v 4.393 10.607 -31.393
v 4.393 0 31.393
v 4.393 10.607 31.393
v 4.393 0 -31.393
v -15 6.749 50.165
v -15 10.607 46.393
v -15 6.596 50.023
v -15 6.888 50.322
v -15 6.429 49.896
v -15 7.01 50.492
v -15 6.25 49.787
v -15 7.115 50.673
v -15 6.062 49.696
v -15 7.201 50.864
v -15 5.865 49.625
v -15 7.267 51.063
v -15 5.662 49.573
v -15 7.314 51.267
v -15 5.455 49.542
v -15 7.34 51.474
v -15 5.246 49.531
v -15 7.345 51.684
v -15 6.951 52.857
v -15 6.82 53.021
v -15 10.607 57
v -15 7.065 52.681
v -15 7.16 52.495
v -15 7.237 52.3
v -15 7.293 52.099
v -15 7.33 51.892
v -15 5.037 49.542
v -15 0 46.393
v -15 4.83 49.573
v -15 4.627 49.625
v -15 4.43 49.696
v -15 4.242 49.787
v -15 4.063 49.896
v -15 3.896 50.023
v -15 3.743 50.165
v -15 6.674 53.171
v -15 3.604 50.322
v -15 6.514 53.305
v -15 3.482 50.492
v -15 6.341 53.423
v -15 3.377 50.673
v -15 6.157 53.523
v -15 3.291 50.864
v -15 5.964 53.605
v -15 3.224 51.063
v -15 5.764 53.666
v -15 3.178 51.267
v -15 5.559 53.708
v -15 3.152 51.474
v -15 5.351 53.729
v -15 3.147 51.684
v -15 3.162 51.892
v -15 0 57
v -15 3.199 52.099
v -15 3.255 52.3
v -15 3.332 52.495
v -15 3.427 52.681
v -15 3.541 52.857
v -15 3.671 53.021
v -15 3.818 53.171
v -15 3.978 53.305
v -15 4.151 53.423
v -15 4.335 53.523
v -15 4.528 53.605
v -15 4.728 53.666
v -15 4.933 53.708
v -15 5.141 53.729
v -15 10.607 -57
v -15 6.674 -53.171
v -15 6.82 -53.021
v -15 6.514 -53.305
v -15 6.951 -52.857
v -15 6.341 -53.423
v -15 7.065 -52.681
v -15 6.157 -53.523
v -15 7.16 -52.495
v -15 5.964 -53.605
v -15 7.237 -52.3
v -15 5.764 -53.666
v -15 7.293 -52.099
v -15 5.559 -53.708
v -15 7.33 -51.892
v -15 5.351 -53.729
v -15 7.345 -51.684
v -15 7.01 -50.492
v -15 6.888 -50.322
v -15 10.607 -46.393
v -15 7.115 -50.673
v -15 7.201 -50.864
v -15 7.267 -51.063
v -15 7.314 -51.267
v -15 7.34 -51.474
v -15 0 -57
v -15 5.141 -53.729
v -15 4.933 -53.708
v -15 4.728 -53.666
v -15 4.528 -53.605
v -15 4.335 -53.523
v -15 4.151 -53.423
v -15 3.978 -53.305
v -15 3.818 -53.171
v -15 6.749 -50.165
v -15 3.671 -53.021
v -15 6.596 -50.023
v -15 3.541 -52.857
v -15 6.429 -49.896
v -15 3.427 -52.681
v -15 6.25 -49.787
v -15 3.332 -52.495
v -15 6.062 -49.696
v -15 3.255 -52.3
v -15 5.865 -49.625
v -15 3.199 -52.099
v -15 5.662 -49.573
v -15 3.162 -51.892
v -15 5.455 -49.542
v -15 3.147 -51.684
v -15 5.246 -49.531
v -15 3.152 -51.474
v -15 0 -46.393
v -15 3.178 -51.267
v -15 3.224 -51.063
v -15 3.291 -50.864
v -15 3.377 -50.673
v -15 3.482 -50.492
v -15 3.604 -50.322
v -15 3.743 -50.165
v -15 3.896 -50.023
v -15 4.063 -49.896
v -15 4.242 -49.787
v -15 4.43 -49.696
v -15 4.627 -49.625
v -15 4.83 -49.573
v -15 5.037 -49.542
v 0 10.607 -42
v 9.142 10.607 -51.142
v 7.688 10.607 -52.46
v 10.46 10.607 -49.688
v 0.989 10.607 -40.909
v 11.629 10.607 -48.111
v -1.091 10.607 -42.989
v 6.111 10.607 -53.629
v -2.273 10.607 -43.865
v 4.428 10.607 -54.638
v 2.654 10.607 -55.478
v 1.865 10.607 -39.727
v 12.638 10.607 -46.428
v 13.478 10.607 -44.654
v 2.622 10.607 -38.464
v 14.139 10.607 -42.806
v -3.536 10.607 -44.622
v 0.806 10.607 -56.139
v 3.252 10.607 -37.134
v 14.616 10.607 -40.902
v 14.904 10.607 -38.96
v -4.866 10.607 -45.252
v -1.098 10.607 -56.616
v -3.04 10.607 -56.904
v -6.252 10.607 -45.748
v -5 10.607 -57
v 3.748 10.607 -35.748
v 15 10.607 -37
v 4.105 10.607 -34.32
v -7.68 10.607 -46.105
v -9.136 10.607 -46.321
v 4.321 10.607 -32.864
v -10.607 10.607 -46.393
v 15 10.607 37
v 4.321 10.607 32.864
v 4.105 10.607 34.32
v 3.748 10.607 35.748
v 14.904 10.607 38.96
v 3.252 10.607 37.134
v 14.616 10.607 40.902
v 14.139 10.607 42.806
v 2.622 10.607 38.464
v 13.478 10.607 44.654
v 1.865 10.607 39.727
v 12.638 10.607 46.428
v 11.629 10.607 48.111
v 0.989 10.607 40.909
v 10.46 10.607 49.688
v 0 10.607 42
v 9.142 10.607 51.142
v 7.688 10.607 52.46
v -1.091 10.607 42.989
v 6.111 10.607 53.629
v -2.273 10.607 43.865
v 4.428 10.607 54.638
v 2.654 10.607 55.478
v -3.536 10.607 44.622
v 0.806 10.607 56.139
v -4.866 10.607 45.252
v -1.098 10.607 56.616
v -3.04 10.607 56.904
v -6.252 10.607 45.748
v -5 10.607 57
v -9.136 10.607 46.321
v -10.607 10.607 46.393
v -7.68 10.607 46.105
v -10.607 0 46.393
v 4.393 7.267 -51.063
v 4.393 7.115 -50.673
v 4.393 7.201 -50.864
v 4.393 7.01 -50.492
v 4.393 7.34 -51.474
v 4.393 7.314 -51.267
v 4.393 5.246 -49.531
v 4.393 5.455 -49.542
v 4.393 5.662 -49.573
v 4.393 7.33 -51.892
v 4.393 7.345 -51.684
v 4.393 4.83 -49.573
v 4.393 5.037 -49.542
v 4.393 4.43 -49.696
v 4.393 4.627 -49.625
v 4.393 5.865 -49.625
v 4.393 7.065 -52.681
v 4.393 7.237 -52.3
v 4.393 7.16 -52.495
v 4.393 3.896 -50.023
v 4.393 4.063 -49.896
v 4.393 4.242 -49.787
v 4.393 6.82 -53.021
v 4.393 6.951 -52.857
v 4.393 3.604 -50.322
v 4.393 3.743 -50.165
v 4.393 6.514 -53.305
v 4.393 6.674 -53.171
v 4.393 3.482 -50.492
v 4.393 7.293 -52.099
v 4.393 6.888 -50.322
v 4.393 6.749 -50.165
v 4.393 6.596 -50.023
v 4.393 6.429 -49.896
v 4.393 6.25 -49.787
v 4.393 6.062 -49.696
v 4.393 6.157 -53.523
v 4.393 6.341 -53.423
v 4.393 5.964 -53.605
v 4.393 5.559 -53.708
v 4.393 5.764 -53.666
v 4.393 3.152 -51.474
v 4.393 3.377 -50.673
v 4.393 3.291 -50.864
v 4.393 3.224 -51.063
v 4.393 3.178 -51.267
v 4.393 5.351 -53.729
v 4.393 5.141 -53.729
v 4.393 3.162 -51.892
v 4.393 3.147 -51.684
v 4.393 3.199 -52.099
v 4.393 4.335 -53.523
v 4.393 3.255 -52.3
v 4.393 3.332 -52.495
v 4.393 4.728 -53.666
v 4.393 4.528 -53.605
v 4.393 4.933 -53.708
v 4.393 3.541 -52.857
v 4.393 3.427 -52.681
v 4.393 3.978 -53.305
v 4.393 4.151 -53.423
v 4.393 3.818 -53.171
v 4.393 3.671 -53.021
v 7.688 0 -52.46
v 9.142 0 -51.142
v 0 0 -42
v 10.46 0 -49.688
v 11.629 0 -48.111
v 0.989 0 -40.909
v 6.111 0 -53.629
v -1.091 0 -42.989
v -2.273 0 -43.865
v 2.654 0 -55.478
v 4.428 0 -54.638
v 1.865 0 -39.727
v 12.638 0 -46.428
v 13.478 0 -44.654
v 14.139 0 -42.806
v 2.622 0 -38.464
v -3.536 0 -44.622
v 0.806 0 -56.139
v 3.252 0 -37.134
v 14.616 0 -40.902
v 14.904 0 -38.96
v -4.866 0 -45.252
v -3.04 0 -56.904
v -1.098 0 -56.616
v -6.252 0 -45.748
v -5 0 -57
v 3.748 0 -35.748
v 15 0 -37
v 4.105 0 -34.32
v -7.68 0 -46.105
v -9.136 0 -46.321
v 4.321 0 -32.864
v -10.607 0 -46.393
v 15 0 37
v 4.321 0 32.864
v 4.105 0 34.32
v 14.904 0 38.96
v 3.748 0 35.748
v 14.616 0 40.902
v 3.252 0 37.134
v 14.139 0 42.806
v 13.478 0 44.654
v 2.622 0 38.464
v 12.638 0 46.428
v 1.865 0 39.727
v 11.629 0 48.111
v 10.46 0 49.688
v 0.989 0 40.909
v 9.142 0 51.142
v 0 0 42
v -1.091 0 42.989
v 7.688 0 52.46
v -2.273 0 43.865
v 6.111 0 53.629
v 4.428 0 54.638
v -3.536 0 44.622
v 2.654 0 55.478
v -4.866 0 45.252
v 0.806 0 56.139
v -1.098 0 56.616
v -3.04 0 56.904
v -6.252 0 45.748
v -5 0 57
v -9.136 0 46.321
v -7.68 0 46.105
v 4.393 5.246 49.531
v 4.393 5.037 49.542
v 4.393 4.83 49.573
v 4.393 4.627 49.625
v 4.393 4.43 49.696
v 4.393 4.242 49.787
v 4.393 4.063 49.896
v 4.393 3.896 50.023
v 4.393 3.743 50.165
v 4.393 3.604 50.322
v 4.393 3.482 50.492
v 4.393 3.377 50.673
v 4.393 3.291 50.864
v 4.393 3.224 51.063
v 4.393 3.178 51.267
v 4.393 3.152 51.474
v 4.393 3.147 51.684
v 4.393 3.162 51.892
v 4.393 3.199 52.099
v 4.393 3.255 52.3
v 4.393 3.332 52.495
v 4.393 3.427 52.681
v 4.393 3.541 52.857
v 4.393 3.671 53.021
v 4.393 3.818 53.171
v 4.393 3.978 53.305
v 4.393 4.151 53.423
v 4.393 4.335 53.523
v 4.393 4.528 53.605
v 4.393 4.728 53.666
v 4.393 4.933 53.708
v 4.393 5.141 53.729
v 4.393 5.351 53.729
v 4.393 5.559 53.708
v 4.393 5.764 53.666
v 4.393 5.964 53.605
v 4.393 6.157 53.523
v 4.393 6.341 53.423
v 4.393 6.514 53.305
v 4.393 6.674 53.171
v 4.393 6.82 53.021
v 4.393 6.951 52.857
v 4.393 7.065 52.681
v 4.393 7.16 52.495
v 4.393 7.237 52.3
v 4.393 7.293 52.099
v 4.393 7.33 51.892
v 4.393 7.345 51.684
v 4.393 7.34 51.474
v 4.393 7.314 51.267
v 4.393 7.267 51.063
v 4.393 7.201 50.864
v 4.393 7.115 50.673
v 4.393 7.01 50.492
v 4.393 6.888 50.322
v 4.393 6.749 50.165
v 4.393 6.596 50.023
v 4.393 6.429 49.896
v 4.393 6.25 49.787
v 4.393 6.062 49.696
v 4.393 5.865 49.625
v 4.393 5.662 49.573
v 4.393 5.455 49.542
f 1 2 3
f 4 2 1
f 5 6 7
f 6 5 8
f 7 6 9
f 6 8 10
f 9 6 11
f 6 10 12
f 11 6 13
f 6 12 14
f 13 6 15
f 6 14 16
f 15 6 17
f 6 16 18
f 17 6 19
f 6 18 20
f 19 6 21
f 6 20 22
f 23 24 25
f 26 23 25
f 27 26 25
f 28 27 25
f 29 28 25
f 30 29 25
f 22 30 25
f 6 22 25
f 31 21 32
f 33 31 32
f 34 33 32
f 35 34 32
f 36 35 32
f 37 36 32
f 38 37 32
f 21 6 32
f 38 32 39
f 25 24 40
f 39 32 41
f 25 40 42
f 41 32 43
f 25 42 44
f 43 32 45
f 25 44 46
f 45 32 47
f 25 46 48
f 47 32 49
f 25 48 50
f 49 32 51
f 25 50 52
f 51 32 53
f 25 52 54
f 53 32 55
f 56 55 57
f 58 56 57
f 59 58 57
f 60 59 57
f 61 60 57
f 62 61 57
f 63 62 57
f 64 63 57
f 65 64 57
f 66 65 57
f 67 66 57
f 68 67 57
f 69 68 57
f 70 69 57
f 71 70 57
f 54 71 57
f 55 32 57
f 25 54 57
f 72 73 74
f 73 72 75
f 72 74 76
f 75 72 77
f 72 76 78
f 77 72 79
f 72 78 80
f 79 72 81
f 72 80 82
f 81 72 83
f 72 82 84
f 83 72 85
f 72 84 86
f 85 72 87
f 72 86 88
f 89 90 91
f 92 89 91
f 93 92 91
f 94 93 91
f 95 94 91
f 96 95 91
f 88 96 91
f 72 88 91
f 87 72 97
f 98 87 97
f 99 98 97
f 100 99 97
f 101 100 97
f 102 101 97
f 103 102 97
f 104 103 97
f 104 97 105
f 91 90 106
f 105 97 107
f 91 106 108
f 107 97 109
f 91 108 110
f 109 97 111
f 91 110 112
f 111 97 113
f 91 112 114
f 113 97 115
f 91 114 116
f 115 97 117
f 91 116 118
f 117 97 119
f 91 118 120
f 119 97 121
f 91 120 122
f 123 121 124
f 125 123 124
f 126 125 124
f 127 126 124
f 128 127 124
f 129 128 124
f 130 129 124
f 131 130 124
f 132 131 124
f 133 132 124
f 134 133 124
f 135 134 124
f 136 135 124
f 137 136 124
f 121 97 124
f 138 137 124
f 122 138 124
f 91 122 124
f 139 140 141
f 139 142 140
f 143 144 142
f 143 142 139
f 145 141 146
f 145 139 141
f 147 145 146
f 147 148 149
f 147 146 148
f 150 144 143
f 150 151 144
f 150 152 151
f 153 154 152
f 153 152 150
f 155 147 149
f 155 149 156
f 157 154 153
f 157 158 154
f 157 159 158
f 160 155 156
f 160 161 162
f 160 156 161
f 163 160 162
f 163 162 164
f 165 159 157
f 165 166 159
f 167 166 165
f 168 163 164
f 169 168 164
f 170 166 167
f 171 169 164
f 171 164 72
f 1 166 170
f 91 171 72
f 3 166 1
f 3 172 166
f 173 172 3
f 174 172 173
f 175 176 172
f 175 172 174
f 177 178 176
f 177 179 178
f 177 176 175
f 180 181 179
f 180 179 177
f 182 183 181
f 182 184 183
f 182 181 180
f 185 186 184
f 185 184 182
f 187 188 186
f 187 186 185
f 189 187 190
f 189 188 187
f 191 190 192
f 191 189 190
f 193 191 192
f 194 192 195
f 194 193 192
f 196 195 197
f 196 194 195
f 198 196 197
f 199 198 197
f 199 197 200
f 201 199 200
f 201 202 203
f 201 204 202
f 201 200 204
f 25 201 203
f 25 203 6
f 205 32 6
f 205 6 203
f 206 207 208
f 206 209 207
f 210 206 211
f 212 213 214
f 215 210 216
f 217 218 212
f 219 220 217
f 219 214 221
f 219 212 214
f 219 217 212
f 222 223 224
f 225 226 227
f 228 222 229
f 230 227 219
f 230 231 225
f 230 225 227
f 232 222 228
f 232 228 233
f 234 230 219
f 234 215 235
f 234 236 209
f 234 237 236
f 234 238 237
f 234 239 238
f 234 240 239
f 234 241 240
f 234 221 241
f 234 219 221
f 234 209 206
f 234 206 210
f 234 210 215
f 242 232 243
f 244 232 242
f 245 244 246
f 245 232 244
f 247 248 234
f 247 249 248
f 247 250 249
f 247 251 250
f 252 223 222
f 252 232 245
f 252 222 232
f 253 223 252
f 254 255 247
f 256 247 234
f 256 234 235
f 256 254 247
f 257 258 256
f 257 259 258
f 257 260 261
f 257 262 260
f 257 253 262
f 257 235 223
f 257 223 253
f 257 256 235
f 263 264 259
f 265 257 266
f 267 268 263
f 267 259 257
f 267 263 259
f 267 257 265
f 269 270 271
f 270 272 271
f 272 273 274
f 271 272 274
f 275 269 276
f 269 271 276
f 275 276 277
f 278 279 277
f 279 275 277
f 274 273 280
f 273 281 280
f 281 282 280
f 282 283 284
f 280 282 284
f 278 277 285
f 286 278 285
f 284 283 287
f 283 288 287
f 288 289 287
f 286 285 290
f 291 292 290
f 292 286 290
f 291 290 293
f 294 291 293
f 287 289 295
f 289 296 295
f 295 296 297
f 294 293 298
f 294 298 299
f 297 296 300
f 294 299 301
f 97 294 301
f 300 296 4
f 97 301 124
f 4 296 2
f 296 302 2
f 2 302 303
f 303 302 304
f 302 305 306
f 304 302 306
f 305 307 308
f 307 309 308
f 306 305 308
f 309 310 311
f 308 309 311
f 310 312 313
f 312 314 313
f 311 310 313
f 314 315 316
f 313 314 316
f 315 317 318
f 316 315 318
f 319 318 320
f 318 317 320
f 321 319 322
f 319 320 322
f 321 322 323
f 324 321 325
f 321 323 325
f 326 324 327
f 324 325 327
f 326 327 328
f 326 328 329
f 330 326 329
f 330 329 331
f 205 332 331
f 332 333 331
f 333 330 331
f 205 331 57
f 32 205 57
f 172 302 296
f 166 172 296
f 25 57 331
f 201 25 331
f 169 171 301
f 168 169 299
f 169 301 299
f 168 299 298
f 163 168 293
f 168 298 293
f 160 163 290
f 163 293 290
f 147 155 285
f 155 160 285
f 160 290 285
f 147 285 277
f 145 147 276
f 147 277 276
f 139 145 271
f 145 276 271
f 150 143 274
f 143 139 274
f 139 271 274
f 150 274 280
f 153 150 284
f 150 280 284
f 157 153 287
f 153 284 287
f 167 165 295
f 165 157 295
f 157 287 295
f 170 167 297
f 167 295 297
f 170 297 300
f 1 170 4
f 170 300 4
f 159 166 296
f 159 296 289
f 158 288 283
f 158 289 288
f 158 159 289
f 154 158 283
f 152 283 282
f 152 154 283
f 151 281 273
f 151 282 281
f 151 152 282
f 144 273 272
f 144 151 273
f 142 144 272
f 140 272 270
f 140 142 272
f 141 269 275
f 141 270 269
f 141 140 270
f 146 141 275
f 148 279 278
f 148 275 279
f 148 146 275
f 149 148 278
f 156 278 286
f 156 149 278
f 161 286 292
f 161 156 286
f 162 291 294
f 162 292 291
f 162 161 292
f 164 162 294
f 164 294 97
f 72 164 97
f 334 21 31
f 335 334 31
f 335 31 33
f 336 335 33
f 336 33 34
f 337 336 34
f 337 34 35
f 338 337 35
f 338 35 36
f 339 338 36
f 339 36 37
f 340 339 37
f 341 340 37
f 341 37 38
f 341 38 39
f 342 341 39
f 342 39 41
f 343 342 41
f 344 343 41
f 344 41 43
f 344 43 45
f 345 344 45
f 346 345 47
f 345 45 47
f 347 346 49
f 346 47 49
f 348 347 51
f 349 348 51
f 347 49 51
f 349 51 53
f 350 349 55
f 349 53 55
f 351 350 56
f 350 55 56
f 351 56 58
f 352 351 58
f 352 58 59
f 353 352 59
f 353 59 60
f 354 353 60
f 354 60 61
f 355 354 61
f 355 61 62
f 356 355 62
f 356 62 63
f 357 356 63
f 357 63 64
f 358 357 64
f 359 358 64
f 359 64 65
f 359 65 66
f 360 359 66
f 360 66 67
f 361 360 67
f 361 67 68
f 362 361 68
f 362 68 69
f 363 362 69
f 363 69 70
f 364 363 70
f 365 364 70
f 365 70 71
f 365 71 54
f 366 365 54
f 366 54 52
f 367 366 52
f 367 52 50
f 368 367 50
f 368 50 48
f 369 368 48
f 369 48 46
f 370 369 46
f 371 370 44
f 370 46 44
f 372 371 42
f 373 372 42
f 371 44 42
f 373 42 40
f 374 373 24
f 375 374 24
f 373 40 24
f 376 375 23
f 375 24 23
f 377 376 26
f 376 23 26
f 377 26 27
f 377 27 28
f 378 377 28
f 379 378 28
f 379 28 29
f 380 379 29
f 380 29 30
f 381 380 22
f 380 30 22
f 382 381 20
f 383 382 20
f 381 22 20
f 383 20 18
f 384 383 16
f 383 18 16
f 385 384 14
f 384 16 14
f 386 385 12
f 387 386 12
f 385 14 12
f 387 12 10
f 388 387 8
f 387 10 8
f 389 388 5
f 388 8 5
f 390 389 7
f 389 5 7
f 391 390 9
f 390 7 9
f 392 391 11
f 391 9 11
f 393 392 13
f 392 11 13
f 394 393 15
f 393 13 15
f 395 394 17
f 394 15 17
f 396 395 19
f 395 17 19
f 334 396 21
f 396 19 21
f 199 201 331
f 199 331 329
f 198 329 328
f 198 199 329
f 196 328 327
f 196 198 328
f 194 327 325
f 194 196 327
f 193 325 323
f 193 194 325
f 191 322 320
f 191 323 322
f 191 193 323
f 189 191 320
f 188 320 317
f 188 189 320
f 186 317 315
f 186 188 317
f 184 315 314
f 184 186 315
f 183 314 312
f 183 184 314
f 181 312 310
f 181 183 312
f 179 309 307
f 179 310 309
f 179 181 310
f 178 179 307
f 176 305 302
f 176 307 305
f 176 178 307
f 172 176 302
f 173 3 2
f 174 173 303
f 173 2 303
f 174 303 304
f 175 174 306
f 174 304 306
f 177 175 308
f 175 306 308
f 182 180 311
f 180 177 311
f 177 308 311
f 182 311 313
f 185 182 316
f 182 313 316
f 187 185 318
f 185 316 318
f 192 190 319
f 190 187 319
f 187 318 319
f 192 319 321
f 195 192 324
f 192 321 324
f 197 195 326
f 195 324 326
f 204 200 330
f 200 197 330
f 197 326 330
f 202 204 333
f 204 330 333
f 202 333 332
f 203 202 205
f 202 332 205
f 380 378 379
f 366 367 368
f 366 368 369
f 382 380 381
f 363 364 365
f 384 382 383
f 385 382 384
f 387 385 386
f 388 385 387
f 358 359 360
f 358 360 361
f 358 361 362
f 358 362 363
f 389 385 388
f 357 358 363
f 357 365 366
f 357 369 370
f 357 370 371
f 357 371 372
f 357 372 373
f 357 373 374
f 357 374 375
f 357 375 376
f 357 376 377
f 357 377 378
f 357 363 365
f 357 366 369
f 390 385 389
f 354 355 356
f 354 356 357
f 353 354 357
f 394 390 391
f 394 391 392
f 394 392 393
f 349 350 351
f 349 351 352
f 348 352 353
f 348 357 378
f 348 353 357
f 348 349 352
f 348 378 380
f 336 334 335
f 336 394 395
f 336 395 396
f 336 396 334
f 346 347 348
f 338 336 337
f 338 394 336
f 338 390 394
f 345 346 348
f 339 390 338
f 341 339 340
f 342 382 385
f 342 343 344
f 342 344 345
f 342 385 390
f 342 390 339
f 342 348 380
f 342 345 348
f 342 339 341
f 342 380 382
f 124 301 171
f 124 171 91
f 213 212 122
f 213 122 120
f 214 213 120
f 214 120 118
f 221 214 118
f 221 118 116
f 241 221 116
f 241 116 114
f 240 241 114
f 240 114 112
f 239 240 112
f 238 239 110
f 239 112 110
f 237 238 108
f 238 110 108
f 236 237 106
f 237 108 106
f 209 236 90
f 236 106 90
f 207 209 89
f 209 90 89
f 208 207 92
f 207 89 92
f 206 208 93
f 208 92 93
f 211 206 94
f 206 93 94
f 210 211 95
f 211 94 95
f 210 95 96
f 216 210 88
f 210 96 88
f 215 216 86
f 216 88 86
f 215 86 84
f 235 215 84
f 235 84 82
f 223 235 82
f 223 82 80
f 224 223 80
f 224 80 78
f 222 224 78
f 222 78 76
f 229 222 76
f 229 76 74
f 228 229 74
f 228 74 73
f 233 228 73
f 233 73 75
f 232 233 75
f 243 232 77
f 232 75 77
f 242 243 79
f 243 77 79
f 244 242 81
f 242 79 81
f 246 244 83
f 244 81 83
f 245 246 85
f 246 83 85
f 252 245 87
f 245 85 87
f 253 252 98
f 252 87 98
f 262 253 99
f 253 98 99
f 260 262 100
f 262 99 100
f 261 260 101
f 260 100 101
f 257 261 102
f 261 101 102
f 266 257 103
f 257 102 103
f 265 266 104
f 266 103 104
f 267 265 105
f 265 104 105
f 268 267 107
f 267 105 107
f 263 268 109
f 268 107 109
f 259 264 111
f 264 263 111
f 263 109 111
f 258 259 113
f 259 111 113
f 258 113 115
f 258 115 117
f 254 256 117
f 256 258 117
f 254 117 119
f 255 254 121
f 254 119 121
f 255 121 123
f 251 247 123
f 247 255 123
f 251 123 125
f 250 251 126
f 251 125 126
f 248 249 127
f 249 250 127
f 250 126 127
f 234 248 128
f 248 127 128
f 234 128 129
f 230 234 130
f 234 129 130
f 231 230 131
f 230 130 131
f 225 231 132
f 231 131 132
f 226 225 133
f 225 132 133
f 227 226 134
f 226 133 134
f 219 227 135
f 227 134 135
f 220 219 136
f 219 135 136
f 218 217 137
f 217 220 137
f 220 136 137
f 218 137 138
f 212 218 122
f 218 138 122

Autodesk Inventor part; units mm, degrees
ref_plane "YZ Plane" through (0, 0, 0) normal (1, 0, 0) x (0, 1, 0)
ref_plane "XZ Plane" through (0, 0, 0) normal (0, 1, 0) x (-1, 0, 0)
ref_plane "XY Plane" through (0, 0, 0) normal (0, 0, 1) x (1, 0, 0)
sketch "Sketch1" plane through (0, 0, 0) normal (0, 1, 0) x (-1, 0, 0)
  line L0 (15, 57) -> (-15, 57)
  line L1 (-15, 57) -> (-15, -57)
  line L2 (-15, -57) -> (15, -57)
  line L3 (15, -57) -> (15, 57)
  line L4 (0, 57) -> (0, -57) construction
  line L5 (15, 0) -> (-15, 0) construction
  line L6 (15, 46.3934) -> (10.6066, 46.3934)
  line L7 (-4.3934, 31.3934) -> (-4.3934, -31.3934)
  line L8 (10.6066, -46.3934) -> (15, -46.3934)
  line L9 (15, -46.3934) -> (15, 46.3934)
  arc A0 (10.6066, 46.3934) -> (-4.3934, 31.3934) centre (10.6066, 31.3934) ccw
  arc A1 (-4.3934, -31.3934) -> (10.6066, -46.3934) centre (10.6066, -31.3934) ccw
  point P0 (0, 0)
  point P1 (-4.3934, -46.3934)
  point P2 (-4.3934, 46.3934)
  dimension "d0" = 114
  dimension "d1" = 30
  dimension "d4" = 15
  dimension "d5" = 10.6066
  dimension "d17" = 92.7868
  dimension "d20" = 15
extrude "Extrusion1" add sketch "Sketch1" along normal blind 10.6066 contours L3 L6 A0 L7 A1 L8 L2 L1 L0
sketch "Sketch4" plane through (4.3934, 0, 46.3934) normal (-1, 0, 0) x (0, 0, 1)
  circle A0 centre (5.2379, 5.2459) radius 2.1 projected
  circle A1 centre (-98.0247, 5.2459) radius 2.1 projected
  line L0 (5.2379, 5.2459) -> (-98.0247, 5.2459)
  point P0 (-46.3934, 0)
  dimension "d18" = 103.2627
fillet "Fillet2" radius 20 2 edges at (15, 5.3033, 57) (15, 5.3033, -57)
hole "Hole2" at (4.3934, 5.2459, 51.6313) direction (-1, 0, 0) diameter 4.2 end through all
mirror "Mirror2" about plane through (0, 0, 0) normal (0, 0, 1) of "Hole2"
equation "\"d6\" = d5"
properties part number "acc door handle"
